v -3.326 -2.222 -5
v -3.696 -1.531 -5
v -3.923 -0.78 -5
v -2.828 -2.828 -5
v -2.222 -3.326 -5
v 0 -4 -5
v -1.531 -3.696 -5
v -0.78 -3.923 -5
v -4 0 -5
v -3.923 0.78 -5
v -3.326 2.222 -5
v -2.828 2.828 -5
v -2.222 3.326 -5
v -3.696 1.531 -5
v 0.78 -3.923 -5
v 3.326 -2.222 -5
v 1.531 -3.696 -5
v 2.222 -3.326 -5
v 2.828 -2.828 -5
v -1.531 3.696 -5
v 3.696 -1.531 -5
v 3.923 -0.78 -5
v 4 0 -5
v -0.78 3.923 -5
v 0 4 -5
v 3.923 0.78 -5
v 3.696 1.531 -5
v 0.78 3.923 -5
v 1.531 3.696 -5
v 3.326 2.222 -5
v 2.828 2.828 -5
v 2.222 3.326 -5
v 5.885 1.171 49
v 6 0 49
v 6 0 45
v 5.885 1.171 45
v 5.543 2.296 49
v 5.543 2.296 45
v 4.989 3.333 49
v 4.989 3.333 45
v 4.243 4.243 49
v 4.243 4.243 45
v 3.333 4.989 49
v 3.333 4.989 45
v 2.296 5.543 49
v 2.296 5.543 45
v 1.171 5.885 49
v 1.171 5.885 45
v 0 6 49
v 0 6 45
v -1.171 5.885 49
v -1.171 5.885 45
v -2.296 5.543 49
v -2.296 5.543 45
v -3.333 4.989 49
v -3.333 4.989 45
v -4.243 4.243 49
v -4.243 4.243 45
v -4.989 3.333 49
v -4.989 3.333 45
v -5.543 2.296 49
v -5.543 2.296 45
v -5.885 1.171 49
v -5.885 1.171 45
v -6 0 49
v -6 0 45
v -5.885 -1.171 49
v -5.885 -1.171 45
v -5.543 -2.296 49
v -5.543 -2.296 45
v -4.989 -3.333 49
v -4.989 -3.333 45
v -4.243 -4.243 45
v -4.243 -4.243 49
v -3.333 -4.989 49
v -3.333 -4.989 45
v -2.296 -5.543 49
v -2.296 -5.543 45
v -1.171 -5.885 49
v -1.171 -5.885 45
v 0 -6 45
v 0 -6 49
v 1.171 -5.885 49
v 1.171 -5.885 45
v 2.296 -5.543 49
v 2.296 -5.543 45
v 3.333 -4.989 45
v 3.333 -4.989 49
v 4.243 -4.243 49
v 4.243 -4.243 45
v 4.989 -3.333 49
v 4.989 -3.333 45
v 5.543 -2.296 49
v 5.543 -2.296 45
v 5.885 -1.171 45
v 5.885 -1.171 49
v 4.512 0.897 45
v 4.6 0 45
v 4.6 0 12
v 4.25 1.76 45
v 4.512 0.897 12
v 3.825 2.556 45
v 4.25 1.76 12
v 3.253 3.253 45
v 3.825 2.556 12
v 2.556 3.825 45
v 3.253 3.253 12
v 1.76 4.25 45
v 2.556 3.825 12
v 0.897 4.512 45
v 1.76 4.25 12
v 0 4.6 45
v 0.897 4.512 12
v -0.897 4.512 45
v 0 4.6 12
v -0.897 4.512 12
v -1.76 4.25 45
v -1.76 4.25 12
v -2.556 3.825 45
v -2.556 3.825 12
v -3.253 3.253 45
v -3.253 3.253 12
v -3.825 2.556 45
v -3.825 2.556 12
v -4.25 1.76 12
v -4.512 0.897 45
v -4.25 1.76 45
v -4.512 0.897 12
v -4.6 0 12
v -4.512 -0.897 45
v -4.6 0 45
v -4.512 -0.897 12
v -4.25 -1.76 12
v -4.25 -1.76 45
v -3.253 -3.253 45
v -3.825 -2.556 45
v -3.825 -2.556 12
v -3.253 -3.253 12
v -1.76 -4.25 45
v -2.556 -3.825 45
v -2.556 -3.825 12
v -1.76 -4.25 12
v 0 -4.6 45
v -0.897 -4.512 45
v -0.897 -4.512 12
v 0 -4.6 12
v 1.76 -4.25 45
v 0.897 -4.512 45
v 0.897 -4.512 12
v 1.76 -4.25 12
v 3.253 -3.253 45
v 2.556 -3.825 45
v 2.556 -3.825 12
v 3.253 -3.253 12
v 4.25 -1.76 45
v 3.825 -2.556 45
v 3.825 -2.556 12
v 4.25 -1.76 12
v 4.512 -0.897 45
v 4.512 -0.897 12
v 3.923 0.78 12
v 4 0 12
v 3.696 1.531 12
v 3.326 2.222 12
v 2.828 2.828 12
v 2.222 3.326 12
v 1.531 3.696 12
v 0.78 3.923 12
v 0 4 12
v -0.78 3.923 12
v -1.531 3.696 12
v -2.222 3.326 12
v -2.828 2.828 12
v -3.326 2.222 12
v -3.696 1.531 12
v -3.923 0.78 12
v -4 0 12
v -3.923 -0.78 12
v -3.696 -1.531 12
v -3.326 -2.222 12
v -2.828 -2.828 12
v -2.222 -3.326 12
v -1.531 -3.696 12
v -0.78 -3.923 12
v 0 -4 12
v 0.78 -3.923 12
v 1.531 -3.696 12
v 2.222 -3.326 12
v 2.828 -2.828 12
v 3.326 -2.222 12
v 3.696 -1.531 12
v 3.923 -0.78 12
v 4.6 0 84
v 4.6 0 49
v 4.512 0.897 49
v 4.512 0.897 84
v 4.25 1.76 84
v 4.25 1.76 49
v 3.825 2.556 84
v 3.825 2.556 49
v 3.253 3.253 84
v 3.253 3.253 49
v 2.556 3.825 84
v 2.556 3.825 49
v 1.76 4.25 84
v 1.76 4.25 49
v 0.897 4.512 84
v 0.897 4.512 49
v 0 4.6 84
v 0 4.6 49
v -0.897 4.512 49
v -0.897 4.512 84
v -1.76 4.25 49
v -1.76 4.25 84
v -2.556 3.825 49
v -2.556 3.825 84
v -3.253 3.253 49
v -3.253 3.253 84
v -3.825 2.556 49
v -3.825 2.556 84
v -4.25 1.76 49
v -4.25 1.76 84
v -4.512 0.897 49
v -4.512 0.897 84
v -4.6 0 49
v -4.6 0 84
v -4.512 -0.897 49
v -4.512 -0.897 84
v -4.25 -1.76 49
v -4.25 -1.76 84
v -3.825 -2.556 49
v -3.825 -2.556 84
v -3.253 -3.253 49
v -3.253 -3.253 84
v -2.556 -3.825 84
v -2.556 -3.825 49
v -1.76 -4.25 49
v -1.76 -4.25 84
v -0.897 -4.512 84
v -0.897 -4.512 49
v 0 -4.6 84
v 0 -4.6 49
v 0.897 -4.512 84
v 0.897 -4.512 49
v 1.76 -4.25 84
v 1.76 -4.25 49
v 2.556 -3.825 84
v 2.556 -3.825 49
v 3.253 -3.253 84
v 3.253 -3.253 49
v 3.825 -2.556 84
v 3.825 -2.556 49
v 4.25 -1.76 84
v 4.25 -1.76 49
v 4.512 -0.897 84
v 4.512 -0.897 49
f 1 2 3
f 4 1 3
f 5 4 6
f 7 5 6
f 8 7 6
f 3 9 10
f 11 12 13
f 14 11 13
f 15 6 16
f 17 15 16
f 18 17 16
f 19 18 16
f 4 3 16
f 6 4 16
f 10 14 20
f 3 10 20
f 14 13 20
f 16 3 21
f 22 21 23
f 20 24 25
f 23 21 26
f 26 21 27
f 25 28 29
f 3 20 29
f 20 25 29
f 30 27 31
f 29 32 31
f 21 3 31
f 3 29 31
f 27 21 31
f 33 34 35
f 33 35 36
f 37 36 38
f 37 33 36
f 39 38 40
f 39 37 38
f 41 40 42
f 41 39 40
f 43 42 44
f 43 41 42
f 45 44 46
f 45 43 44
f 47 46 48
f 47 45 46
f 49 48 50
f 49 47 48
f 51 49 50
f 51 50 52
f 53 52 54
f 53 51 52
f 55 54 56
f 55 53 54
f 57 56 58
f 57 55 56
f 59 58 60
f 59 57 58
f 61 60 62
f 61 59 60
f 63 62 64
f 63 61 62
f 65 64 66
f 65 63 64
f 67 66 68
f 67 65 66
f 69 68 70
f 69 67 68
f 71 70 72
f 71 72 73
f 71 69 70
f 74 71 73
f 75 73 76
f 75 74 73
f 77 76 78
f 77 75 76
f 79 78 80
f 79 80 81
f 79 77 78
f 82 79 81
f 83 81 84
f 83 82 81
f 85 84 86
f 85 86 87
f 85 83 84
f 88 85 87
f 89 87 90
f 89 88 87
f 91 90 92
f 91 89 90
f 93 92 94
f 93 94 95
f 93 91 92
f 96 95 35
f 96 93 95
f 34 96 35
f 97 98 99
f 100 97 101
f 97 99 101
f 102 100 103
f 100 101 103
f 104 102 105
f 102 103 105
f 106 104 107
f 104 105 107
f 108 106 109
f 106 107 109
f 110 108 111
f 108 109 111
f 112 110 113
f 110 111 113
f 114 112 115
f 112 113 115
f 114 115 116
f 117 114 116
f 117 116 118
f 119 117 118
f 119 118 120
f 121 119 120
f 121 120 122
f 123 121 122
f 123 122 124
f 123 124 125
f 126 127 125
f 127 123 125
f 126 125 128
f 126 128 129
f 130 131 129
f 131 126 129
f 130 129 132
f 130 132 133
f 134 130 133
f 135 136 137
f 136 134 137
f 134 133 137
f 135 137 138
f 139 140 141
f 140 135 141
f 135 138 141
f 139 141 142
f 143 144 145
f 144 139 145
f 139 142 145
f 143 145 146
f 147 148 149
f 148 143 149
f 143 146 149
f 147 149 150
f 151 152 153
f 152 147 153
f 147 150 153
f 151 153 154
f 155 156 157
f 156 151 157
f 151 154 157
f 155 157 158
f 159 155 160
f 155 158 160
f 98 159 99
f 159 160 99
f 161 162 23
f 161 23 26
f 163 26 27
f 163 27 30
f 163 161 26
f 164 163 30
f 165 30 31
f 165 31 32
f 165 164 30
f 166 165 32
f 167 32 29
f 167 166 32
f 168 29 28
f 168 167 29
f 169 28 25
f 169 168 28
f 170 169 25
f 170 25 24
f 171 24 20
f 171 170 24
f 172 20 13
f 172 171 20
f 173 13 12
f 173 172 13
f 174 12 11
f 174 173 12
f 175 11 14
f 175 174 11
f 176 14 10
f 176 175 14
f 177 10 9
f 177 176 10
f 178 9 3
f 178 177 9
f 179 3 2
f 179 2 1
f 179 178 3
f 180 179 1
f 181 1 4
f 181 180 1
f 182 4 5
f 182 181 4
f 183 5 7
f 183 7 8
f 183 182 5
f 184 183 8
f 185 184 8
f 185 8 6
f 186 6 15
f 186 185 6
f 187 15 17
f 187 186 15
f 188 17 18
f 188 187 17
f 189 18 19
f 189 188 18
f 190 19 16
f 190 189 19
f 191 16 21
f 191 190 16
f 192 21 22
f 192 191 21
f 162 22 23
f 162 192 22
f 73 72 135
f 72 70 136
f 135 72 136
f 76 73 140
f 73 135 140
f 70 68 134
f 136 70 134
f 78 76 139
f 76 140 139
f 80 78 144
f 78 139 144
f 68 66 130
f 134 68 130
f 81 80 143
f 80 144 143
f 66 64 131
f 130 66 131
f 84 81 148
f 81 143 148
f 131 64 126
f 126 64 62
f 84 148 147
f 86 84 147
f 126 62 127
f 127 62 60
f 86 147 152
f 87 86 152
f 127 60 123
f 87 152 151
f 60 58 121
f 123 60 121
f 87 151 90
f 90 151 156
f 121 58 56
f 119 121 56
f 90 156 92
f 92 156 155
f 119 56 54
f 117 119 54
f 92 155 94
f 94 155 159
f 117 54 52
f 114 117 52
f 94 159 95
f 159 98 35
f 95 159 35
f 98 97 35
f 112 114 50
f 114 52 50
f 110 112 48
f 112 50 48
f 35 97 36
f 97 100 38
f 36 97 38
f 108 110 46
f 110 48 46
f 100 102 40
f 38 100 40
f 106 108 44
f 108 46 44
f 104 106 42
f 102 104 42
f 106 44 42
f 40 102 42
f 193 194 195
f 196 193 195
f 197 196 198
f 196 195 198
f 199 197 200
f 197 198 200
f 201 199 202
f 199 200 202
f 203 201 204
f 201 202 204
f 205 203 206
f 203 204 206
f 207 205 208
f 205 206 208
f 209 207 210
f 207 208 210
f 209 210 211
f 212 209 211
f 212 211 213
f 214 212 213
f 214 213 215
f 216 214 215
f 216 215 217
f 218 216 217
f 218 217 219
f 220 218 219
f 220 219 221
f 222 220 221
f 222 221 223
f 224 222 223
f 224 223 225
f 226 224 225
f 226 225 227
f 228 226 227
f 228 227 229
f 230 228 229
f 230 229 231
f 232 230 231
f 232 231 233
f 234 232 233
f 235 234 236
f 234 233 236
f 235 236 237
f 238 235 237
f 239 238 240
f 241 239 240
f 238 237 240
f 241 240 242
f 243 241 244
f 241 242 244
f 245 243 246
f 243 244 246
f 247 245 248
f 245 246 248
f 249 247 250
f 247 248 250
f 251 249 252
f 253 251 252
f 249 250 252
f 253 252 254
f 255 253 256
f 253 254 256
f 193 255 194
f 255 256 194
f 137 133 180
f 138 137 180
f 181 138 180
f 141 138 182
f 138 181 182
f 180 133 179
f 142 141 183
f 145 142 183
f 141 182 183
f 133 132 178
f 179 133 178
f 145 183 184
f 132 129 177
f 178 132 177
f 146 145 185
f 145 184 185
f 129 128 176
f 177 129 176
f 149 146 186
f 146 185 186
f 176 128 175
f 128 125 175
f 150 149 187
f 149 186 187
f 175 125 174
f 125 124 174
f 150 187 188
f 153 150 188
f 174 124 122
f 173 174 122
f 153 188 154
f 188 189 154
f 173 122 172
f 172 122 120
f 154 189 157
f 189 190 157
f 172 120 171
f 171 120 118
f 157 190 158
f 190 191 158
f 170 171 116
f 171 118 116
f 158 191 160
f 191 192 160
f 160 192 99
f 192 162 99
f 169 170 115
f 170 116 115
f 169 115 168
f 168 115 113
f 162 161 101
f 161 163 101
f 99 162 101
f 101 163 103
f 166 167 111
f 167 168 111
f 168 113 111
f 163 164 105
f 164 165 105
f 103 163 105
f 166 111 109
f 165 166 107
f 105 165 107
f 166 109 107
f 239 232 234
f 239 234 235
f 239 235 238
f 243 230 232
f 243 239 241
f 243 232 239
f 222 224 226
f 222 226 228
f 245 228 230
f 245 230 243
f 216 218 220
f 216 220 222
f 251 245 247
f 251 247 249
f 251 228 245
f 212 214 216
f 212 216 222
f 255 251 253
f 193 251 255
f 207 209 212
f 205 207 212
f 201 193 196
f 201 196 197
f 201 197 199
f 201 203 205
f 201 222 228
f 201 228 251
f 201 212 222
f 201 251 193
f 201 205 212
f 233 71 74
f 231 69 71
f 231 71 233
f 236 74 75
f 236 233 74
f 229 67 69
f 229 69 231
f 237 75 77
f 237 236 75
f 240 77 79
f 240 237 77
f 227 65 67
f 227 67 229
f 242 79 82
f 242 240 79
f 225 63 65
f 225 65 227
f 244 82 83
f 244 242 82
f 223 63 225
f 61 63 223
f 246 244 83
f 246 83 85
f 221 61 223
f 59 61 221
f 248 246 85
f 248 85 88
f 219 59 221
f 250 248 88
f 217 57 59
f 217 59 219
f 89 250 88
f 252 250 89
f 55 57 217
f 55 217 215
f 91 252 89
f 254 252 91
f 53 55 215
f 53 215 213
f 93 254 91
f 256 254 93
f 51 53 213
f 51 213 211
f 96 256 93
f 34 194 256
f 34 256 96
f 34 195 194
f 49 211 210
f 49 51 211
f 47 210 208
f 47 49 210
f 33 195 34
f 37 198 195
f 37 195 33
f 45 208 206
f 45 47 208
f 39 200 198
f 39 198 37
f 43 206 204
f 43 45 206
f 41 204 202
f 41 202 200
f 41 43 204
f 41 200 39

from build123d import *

# Parameters (mm, degrees)
BOSS_EXTRUDE1_START = 12
SKETCH1_R           = 4
BOSS_EXTRUDE1_DEPTH = 17
BOSS_EXTRUDE2_START = 12
SKETCH2_R           = 4.6
BOSS_EXTRUDE2_DEPTH = 72
BOSS_EXTRUDE3_START = 49
SKETCH3_R           = 6
BOSS_EXTRUDE3_DEPTH = 4


with BuildPart() as part:
    # Sketch1 → Boss-Extrude1 (new body)
    with BuildSketch(Plane.XY.offset(BOSS_EXTRUDE1_START)):
        Circle(SKETCH1_R)
    extrude(amount=-BOSS_EXTRUDE1_DEPTH)

    # Sketch2 → Boss-Extrude2 (add)
    with BuildSketch(Plane.XY.offset(BOSS_EXTRUDE2_START)):
        Circle(SKETCH2_R)
    extrude(amount=BOSS_EXTRUDE2_DEPTH)

    # Sketch3 → Boss-Extrude3 (add)
    with BuildSketch(Plane.XY.offset(BOSS_EXTRUDE3_START)):
        Circle(SKETCH3_R)
    extrude(amount=-BOSS_EXTRUDE3_DEPTH)


solid = part.part
